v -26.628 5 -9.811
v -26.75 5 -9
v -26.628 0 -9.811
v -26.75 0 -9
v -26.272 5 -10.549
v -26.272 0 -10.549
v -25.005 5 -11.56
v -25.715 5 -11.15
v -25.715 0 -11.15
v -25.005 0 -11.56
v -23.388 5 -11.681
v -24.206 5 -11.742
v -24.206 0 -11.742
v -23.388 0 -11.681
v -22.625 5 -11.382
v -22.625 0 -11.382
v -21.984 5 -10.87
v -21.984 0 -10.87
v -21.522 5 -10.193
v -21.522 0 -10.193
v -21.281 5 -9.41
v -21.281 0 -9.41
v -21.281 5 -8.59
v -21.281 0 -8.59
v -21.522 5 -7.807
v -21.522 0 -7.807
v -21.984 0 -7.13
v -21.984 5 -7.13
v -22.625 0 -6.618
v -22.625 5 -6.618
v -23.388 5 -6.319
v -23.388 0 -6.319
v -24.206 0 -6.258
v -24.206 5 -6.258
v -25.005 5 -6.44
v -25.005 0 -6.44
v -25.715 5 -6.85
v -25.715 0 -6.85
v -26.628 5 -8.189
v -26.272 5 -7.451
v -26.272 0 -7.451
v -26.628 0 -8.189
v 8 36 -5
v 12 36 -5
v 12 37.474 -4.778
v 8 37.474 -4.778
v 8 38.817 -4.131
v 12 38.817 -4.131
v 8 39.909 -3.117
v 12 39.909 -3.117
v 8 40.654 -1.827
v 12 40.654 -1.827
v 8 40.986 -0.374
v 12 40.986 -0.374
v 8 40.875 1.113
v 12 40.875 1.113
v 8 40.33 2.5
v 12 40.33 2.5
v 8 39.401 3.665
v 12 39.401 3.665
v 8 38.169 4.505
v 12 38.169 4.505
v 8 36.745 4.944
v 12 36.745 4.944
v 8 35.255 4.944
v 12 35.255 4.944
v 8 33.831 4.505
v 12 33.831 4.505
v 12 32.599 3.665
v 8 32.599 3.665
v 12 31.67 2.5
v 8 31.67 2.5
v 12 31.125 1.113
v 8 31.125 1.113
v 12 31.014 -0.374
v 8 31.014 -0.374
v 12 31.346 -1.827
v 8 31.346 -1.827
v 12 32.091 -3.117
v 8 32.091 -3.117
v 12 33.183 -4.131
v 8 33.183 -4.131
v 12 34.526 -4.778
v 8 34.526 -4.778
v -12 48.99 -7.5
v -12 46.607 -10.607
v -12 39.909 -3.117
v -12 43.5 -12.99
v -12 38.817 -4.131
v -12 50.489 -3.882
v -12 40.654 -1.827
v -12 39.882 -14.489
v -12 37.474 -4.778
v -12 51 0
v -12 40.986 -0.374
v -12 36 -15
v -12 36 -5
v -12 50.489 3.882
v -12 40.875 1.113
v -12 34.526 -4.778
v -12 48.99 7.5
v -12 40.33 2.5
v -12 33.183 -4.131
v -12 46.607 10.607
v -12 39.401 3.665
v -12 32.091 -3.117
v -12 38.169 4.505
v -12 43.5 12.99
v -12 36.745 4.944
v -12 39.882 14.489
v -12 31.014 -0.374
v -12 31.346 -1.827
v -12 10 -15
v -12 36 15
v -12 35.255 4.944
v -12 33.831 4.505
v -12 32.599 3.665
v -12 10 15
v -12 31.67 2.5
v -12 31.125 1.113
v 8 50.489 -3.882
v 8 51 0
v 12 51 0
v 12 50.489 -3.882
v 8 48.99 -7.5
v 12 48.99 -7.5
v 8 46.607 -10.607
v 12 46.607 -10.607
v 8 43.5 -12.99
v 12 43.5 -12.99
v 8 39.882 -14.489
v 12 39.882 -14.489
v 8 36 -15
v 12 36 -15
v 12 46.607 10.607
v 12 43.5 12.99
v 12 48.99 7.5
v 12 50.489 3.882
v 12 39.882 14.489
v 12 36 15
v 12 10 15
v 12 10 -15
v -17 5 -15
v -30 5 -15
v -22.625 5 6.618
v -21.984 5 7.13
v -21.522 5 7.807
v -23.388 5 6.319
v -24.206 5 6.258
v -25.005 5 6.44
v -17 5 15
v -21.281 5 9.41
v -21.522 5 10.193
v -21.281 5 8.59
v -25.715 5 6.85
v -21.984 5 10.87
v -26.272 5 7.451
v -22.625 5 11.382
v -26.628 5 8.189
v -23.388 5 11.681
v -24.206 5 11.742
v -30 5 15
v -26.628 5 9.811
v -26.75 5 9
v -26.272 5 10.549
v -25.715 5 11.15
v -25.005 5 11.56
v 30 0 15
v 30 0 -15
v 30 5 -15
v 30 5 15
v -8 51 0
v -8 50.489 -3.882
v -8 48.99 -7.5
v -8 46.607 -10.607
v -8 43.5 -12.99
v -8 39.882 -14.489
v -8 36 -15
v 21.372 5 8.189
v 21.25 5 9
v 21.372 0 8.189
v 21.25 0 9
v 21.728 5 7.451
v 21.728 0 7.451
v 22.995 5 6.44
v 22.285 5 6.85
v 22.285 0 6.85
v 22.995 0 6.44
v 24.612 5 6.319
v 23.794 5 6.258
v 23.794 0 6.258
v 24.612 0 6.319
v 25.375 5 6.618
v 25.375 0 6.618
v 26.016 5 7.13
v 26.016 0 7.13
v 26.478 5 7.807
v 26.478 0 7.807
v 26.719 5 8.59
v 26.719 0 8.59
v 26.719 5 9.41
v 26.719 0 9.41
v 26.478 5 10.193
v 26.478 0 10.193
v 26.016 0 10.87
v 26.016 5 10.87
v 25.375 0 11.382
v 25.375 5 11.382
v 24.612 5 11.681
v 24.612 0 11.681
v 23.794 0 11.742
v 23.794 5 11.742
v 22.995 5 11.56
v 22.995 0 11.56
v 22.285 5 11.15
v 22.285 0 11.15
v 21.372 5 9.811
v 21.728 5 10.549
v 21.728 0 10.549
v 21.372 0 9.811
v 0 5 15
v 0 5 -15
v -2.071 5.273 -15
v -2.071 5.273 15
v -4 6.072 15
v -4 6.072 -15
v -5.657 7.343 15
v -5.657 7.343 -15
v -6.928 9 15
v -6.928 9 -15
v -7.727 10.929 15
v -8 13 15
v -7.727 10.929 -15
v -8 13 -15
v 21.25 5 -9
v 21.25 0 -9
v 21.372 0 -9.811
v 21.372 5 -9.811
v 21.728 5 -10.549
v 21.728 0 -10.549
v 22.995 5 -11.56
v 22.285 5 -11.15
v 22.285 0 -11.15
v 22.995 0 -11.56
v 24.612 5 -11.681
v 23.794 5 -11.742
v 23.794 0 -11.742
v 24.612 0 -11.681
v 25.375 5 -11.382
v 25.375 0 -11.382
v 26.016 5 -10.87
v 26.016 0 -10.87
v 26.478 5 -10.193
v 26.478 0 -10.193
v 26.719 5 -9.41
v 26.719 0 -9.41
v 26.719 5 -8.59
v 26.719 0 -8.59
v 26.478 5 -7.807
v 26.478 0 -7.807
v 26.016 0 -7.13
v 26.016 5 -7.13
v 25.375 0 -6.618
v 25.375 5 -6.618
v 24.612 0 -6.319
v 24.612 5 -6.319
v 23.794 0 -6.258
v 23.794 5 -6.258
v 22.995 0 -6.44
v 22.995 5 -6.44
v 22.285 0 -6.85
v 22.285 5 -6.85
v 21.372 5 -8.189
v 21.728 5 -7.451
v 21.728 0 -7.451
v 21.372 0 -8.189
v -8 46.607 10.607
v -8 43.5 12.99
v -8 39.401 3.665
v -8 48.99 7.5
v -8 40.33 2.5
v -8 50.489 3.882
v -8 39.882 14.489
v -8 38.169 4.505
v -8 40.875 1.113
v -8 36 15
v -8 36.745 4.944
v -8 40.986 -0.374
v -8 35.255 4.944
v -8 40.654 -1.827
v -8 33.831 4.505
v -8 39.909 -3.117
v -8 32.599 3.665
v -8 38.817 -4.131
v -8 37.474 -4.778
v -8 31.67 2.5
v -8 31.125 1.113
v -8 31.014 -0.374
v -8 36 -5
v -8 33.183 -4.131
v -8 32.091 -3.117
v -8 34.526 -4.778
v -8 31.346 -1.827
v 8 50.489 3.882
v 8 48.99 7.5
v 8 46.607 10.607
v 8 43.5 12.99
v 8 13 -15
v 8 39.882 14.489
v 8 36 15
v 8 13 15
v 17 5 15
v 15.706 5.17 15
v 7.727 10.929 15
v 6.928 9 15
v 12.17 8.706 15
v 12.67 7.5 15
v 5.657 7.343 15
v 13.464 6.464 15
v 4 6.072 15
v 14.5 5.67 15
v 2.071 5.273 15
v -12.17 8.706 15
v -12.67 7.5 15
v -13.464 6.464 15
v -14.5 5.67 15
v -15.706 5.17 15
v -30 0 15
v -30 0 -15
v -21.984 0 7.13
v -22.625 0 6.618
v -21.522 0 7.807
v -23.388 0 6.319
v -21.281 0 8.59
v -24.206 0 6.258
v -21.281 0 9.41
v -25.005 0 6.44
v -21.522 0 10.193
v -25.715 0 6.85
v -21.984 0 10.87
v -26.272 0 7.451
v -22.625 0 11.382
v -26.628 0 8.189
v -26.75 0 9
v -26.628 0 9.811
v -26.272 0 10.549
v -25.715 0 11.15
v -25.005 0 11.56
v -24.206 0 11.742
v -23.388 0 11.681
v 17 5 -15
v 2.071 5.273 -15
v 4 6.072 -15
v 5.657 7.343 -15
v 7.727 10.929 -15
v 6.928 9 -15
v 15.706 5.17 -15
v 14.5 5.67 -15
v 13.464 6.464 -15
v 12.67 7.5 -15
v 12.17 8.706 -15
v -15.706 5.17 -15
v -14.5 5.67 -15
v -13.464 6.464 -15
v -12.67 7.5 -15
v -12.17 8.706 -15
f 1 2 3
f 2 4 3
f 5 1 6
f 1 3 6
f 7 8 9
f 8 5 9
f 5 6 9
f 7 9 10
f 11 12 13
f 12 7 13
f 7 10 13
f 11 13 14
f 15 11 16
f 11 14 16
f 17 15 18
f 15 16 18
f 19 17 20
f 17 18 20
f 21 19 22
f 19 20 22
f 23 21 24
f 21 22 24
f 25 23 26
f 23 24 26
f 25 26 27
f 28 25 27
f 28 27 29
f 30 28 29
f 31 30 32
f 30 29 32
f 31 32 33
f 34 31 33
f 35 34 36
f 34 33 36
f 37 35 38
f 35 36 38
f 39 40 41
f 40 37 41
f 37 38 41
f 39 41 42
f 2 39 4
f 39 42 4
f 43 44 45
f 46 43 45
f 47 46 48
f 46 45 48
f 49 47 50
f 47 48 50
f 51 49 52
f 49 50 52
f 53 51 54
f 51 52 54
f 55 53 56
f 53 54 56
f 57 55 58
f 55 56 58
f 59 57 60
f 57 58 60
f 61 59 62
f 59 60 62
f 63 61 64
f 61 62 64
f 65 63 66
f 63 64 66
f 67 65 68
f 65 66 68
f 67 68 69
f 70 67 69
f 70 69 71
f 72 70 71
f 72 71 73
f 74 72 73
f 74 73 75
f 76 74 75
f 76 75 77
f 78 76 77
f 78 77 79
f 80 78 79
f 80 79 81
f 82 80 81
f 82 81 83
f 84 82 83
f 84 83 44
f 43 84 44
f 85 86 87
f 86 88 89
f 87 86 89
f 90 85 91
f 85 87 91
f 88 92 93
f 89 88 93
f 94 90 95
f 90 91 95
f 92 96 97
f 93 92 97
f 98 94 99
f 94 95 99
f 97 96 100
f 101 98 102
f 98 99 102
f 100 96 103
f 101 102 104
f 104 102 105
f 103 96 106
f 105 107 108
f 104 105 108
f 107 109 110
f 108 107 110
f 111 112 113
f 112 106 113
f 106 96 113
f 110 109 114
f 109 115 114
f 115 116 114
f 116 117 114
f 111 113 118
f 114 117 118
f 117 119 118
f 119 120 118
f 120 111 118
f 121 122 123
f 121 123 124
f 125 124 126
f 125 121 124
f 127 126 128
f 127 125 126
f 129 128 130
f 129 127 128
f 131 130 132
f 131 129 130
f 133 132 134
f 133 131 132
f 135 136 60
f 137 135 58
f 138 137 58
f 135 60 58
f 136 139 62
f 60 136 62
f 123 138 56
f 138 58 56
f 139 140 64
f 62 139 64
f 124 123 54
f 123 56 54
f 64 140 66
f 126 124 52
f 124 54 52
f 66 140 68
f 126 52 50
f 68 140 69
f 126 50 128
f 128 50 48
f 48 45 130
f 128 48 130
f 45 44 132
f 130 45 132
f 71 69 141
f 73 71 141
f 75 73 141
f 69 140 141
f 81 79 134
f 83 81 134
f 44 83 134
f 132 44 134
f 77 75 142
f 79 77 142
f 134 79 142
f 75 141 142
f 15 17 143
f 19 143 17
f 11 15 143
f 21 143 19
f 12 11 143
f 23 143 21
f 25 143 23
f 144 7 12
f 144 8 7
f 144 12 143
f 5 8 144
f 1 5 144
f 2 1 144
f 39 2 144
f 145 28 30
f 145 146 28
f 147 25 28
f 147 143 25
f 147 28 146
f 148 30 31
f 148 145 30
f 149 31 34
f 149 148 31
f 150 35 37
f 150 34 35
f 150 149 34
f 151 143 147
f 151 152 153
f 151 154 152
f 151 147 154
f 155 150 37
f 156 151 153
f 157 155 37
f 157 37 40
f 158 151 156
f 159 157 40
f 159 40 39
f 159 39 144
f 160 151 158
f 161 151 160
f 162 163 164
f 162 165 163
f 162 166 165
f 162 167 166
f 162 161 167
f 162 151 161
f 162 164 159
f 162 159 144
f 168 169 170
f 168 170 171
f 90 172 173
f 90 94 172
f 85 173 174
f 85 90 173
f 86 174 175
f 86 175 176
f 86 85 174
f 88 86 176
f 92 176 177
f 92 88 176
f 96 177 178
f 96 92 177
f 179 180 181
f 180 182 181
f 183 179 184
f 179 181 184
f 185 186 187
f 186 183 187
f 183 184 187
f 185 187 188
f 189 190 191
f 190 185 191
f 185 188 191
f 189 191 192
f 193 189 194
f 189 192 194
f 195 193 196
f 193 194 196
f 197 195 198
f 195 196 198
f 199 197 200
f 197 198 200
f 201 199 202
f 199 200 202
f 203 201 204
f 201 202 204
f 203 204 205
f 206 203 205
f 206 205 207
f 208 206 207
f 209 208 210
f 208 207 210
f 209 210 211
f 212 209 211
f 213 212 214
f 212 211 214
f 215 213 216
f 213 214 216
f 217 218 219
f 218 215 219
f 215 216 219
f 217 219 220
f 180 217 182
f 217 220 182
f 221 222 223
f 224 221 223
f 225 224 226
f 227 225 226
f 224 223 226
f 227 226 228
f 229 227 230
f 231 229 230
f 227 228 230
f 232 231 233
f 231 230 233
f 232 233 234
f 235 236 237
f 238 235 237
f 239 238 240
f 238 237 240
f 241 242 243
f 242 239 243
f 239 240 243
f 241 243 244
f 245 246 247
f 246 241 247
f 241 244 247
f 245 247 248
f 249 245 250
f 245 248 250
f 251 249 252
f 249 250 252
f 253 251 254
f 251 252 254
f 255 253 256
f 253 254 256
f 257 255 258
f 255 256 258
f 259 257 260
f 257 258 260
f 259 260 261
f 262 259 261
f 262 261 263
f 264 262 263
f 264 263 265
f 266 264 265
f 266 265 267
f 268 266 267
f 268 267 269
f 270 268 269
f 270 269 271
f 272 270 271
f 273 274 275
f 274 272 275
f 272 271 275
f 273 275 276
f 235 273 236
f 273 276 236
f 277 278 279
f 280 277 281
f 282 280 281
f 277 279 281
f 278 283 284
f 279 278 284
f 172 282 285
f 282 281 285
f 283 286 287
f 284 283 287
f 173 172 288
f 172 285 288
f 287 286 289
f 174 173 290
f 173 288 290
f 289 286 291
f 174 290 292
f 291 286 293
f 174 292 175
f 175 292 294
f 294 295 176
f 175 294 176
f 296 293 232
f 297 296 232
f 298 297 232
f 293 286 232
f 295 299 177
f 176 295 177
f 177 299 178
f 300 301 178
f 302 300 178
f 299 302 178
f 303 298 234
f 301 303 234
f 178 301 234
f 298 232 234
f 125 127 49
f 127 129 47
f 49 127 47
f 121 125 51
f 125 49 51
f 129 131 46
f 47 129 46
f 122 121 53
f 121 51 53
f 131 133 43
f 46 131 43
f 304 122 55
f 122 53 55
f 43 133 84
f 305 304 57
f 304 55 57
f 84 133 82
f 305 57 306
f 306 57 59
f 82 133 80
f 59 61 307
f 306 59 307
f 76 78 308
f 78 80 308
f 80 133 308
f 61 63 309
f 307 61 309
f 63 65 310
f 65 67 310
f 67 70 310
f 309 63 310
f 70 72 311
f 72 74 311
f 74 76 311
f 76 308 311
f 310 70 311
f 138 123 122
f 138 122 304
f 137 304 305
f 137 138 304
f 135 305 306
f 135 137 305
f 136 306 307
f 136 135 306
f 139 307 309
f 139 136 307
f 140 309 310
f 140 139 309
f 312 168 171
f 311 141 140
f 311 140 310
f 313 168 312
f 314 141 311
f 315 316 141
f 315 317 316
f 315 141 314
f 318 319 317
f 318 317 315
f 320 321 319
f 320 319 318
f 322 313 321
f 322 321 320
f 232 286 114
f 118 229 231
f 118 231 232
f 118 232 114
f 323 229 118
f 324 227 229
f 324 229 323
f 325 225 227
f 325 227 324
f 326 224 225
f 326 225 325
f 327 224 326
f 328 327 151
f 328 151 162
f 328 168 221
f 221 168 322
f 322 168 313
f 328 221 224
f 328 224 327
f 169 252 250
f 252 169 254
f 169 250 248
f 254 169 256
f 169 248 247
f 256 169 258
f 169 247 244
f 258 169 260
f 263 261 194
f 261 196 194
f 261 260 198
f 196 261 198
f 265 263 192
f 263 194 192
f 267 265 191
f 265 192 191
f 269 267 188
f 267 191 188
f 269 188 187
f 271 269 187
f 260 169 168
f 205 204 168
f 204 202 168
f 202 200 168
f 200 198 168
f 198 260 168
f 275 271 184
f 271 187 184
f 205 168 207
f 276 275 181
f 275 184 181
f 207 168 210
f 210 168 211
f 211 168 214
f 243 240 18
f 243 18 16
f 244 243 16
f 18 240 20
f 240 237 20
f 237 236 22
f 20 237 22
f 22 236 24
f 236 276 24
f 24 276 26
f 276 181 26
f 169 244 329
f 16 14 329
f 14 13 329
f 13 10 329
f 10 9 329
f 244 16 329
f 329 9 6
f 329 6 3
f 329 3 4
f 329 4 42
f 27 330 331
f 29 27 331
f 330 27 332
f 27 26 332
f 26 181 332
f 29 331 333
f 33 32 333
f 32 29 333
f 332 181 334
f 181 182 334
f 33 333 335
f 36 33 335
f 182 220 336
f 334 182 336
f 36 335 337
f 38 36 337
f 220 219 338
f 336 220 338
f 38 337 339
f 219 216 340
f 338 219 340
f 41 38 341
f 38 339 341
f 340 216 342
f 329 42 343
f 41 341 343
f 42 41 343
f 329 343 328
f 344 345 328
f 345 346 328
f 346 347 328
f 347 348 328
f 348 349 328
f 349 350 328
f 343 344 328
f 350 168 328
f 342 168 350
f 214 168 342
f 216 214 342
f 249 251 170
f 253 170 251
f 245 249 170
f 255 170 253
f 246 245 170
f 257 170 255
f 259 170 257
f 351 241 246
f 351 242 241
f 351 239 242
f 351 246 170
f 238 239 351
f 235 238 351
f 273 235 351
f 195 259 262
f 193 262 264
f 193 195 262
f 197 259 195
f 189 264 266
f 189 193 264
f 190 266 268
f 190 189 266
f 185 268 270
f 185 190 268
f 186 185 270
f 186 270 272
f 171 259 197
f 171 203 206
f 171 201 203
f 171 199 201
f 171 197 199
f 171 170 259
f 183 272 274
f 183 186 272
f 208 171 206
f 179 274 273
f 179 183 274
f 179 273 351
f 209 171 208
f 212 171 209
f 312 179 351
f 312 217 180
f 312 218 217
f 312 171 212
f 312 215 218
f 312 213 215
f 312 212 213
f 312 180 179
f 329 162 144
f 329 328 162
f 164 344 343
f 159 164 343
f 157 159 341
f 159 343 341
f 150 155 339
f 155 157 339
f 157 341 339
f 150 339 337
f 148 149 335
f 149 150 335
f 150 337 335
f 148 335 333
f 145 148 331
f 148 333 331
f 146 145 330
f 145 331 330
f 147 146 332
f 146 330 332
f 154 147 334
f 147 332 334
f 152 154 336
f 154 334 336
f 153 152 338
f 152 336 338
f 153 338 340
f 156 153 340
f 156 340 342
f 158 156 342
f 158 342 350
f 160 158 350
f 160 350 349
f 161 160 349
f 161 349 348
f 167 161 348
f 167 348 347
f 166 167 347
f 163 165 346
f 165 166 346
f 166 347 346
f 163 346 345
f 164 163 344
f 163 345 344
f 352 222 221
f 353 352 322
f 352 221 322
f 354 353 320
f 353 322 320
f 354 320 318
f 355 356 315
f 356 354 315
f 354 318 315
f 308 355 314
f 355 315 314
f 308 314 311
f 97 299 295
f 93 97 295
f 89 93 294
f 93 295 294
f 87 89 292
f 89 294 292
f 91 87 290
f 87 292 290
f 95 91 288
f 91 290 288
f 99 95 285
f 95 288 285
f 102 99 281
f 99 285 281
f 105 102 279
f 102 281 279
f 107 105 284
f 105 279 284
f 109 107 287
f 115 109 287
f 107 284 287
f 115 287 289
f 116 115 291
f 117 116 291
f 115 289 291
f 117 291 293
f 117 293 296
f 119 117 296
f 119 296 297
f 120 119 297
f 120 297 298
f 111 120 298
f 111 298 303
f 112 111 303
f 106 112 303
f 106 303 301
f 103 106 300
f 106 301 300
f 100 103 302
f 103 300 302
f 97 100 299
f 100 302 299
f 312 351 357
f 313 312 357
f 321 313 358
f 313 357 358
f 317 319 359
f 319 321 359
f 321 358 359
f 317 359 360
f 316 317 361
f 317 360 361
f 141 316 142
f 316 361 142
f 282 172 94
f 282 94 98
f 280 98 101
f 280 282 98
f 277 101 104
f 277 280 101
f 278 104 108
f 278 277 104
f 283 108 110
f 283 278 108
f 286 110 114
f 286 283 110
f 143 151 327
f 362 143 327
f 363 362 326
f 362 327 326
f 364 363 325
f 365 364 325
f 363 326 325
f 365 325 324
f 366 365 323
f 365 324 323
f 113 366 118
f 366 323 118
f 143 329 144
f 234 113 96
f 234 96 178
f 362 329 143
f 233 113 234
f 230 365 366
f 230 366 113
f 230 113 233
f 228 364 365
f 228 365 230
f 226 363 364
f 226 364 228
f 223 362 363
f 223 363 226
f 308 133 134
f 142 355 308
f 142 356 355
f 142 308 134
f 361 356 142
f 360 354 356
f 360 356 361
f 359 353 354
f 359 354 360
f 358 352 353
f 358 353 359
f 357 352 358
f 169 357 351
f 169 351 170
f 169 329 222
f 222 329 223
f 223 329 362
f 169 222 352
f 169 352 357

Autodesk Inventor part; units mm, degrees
ref_plane "YZ Plane" through (0, 0, 0) normal (1, 0, 0) x (0, 1, 0)
ref_plane "XZ Plane" through (0, 0, 0) normal (0, 1, 0) x (-1, 0, 0)
ref_plane "XY Plane" through (0, 0, 0) normal (0, 0, 1) x (1, 0, 0)
sketch "Sketch1" plane through (0, 0, 0) normal (0, 1, 0) x (-1, 0, 0)
  line L0 (-30, 15) -> (30, 15)
  line L1 (30, 15) -> (30, -15)
  line L2 (30, -15) -> (-30, -15)
  line L3 (-30, -15) -> (-30, 15)
  line L4 (-30, 15) -> (30, -15) construction
  line L5 (30, 15) -> (-30, -15) construction
  circle A0 centre (24, -9) radius 2.75
  circle A1 centre (24, 9) radius 2.75
  circle A2 centre (-24, 9) radius 2.75
  circle A3 centre (-24, -9) radius 2.75
  point P0 (0, 0)
  dimension "d0" = 60
  dimension "d1" = 30
  dimension "d2" = 5.5
  dimension "d3" = 5.5
  dimension "d4" = 5.5
  dimension "d5" = 5.5
  dimension "d6" = 6
  dimension "d7" = 6
  dimension "d8" = 6
  dimension "d9" = 6
  dimension "d10" = 6
  dimension "d11" = 6
  dimension "d12" = 6
  dimension "d13" = 6
extrude "Extrusion1" add sketch "Sketch1" along normal blind 5
sketch "Sketch2" plane through (0, 5, 0) normal (0, 1, 0) x (1, 0, 0)
  line L0 (8, -15) -> (-8, -15)
  line L1 (-8, -15) -> (-8, 15)
  line L2 (-8, 15) -> (8, 15)
  line L3 (8, 15) -> (8, -15)
  line L4 (8, -15) -> (-8, 15) construction
  line L5 (-8, -15) -> (8, 15) construction
  line L6 (-8, 15) -> (-12, 15)
  line L7 (-12, 15) -> (-12, -15)
  line L8 (-12, -15) -> (-8, -15)
  line L9 (-8, -15) -> (-8, 15)
  line L10 (8, -15) -> (12, -15)
  line L11 (12, -15) -> (12, 15)
  line L12 (12, 15) -> (8, 15)
  line L13 (8, 15) -> (8, -15)
  point P0 (0, 0)
  dimension "d16" = 16
  dimension "d17" = 30
  dimension "d18" = 4
  dimension "d19" = 30
  dimension "d20" = 4
extrude "Extrusion2" add sketch "Sketch2" along normal blind 46 contours L3 L12 L11 L10 | L8 L7 L6 L1
sketch "Sketch3" plane through (12, 5, 15) normal (1, 0, 0) x (0, 0, -1)
  circle A0 centre (15, 31) radius 5
  line L0 (30, 0) -> (30, 46) projected
  line L1 (30, -5) -> (0, -5) projected
  point P0 (15, -5)
  dimension "d23" = 10
  dimension "d24" = 15
  dimension "d25" = 36
extrude "Extrusion3" cut sketch "Sketch3" against normal blind 40
fillet "Fillet1" radius 15 4 edges at (10, 51, 15) (10, 51, -15) (-10, 51, -15) (-10, 51, 15)
fillet "Fillet2" radius 5 2 edges at (12, 5, 0) (-12, 5, 0)
fillet "Fillet3" radius 8 2 edges at (-8, 5, 0) (8, 5, 0)
properties part number "Custom Pneumatic Support" material "Stainless Steel"
